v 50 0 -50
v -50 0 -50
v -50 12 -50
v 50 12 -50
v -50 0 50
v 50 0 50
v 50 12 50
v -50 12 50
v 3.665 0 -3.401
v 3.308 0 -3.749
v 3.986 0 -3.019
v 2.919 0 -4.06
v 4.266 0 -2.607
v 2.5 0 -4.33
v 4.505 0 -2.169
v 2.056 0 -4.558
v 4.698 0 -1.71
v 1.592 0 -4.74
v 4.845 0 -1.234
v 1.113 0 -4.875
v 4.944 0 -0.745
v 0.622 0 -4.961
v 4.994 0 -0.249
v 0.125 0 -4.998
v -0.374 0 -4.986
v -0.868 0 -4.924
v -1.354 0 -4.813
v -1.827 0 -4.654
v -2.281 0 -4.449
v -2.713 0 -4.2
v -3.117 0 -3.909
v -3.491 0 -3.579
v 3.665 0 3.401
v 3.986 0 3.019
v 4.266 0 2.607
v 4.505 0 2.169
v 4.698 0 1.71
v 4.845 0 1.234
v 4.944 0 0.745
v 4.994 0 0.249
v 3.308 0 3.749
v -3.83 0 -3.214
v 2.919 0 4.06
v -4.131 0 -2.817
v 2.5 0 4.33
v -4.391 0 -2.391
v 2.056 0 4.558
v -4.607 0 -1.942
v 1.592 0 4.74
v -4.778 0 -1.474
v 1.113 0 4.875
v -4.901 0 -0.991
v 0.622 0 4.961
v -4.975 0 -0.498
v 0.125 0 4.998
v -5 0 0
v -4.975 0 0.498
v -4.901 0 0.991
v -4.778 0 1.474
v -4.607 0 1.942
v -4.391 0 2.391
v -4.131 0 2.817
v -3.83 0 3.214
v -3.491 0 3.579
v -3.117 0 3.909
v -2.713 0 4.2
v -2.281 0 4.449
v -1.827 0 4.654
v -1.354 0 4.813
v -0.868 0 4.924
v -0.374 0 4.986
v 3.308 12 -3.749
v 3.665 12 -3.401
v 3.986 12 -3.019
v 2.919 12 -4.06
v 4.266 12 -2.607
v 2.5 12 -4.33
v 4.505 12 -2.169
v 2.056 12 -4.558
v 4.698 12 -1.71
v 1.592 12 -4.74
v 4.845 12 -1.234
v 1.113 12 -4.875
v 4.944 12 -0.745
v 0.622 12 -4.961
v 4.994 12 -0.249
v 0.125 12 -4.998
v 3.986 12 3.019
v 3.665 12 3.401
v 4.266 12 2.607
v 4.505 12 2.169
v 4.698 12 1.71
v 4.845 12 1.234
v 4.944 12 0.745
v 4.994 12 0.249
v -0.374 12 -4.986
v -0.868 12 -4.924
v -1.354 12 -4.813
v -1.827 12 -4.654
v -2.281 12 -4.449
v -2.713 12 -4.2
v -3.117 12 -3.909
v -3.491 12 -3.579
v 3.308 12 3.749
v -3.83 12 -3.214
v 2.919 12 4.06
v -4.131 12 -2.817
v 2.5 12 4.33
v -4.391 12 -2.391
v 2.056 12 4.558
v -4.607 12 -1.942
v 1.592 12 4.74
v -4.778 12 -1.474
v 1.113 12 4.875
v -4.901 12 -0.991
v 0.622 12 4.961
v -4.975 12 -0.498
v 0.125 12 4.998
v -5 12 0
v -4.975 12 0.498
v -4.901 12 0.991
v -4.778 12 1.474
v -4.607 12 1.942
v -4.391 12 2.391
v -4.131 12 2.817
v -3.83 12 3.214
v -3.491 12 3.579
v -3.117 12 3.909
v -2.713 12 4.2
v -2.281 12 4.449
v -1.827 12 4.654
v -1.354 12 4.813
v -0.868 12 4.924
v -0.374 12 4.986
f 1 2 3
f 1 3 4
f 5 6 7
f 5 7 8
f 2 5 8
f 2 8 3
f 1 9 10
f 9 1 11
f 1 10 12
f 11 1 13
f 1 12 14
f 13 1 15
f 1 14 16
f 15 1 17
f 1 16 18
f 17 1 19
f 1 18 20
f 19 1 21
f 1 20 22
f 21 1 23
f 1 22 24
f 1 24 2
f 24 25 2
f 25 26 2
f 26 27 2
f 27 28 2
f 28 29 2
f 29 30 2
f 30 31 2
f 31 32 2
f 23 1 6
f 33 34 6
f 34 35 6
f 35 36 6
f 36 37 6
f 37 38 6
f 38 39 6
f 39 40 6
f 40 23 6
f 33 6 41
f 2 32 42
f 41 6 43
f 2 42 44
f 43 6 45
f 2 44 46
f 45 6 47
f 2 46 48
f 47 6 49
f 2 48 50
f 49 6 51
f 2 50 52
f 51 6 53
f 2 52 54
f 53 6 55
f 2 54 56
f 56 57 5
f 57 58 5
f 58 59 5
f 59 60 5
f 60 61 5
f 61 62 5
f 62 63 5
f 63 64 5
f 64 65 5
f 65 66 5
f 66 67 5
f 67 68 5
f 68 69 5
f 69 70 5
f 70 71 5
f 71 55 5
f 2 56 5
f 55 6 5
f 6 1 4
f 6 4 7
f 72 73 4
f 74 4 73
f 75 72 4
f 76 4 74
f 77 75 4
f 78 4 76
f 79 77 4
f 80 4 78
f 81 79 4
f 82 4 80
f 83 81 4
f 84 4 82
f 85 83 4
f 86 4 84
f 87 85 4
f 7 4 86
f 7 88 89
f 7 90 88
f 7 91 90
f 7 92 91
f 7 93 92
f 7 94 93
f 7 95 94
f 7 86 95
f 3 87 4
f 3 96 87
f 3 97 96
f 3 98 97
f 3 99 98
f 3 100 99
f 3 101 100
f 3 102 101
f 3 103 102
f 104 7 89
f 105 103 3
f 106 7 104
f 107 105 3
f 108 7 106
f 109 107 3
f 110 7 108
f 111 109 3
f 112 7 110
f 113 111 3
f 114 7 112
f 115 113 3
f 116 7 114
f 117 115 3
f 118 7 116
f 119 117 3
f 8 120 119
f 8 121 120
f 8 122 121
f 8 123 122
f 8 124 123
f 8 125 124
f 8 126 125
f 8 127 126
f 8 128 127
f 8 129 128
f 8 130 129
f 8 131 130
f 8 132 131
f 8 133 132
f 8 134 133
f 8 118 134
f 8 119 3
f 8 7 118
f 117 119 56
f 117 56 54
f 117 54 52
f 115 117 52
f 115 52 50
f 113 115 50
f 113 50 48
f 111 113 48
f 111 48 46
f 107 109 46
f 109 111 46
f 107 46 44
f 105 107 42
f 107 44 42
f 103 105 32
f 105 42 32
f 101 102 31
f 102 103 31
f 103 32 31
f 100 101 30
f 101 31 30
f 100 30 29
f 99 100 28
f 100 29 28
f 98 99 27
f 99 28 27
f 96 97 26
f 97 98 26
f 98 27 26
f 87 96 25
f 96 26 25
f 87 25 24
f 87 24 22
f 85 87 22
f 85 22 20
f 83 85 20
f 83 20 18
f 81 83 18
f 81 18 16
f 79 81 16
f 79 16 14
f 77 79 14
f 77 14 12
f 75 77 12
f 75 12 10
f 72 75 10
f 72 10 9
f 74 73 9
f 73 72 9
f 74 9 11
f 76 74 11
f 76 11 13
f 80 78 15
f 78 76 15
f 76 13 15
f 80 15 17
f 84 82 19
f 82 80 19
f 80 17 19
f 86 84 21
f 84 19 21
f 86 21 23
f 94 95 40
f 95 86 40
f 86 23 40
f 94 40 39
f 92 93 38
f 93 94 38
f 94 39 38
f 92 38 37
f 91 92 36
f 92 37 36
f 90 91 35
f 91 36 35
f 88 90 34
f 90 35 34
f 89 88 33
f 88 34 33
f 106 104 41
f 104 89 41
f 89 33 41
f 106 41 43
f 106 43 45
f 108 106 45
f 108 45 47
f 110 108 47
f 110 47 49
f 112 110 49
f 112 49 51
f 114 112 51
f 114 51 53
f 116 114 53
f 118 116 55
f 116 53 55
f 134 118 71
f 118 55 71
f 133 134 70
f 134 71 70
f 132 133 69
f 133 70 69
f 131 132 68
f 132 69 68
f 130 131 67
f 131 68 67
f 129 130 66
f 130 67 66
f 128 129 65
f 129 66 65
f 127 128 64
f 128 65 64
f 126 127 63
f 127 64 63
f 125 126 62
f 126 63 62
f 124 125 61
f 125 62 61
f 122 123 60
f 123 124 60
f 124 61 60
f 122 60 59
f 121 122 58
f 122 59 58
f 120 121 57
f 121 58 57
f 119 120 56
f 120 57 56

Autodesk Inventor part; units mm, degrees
ref_plane "YZ Plane" through (0, 0, 0) normal (1, 0, 0) x (0, 1, 0)
ref_plane "XZ Plane" through (0, 0, 0) normal (0, 1, 0) x (-1, 0, 0)
ref_plane "XY Plane" through (0, 0, 0) normal (0, 0, 1) x (1, 0, 0)
sketch "Sketch1" plane through (0, 0, 0) normal (0, 1, 0) x (-1, 0, 0)
  line L0 (70, 0) -> (-70, 0) construction
  line L1 (0, -70) -> (0, 70) construction
  line L2 (-50, 50) -> (50, 50)
  line L3 (50, 50) -> (50, -50)
  line L4 (50, -50) -> (-50, -50)
  line L5 (-50, -50) -> (-50, 50)
  line L6 (-50, 50) -> (50, -50) construction
  line L7 (50, 50) -> (-50, -50) construction
  circle A0 centre (0, 0) radius 5
  dimension "d0" = 100
  dimension "d3" = 10
extrude "Extrusion1" add sketch "Sketch1" along normal blind 12
properties part number "Manual_NC_REF"
